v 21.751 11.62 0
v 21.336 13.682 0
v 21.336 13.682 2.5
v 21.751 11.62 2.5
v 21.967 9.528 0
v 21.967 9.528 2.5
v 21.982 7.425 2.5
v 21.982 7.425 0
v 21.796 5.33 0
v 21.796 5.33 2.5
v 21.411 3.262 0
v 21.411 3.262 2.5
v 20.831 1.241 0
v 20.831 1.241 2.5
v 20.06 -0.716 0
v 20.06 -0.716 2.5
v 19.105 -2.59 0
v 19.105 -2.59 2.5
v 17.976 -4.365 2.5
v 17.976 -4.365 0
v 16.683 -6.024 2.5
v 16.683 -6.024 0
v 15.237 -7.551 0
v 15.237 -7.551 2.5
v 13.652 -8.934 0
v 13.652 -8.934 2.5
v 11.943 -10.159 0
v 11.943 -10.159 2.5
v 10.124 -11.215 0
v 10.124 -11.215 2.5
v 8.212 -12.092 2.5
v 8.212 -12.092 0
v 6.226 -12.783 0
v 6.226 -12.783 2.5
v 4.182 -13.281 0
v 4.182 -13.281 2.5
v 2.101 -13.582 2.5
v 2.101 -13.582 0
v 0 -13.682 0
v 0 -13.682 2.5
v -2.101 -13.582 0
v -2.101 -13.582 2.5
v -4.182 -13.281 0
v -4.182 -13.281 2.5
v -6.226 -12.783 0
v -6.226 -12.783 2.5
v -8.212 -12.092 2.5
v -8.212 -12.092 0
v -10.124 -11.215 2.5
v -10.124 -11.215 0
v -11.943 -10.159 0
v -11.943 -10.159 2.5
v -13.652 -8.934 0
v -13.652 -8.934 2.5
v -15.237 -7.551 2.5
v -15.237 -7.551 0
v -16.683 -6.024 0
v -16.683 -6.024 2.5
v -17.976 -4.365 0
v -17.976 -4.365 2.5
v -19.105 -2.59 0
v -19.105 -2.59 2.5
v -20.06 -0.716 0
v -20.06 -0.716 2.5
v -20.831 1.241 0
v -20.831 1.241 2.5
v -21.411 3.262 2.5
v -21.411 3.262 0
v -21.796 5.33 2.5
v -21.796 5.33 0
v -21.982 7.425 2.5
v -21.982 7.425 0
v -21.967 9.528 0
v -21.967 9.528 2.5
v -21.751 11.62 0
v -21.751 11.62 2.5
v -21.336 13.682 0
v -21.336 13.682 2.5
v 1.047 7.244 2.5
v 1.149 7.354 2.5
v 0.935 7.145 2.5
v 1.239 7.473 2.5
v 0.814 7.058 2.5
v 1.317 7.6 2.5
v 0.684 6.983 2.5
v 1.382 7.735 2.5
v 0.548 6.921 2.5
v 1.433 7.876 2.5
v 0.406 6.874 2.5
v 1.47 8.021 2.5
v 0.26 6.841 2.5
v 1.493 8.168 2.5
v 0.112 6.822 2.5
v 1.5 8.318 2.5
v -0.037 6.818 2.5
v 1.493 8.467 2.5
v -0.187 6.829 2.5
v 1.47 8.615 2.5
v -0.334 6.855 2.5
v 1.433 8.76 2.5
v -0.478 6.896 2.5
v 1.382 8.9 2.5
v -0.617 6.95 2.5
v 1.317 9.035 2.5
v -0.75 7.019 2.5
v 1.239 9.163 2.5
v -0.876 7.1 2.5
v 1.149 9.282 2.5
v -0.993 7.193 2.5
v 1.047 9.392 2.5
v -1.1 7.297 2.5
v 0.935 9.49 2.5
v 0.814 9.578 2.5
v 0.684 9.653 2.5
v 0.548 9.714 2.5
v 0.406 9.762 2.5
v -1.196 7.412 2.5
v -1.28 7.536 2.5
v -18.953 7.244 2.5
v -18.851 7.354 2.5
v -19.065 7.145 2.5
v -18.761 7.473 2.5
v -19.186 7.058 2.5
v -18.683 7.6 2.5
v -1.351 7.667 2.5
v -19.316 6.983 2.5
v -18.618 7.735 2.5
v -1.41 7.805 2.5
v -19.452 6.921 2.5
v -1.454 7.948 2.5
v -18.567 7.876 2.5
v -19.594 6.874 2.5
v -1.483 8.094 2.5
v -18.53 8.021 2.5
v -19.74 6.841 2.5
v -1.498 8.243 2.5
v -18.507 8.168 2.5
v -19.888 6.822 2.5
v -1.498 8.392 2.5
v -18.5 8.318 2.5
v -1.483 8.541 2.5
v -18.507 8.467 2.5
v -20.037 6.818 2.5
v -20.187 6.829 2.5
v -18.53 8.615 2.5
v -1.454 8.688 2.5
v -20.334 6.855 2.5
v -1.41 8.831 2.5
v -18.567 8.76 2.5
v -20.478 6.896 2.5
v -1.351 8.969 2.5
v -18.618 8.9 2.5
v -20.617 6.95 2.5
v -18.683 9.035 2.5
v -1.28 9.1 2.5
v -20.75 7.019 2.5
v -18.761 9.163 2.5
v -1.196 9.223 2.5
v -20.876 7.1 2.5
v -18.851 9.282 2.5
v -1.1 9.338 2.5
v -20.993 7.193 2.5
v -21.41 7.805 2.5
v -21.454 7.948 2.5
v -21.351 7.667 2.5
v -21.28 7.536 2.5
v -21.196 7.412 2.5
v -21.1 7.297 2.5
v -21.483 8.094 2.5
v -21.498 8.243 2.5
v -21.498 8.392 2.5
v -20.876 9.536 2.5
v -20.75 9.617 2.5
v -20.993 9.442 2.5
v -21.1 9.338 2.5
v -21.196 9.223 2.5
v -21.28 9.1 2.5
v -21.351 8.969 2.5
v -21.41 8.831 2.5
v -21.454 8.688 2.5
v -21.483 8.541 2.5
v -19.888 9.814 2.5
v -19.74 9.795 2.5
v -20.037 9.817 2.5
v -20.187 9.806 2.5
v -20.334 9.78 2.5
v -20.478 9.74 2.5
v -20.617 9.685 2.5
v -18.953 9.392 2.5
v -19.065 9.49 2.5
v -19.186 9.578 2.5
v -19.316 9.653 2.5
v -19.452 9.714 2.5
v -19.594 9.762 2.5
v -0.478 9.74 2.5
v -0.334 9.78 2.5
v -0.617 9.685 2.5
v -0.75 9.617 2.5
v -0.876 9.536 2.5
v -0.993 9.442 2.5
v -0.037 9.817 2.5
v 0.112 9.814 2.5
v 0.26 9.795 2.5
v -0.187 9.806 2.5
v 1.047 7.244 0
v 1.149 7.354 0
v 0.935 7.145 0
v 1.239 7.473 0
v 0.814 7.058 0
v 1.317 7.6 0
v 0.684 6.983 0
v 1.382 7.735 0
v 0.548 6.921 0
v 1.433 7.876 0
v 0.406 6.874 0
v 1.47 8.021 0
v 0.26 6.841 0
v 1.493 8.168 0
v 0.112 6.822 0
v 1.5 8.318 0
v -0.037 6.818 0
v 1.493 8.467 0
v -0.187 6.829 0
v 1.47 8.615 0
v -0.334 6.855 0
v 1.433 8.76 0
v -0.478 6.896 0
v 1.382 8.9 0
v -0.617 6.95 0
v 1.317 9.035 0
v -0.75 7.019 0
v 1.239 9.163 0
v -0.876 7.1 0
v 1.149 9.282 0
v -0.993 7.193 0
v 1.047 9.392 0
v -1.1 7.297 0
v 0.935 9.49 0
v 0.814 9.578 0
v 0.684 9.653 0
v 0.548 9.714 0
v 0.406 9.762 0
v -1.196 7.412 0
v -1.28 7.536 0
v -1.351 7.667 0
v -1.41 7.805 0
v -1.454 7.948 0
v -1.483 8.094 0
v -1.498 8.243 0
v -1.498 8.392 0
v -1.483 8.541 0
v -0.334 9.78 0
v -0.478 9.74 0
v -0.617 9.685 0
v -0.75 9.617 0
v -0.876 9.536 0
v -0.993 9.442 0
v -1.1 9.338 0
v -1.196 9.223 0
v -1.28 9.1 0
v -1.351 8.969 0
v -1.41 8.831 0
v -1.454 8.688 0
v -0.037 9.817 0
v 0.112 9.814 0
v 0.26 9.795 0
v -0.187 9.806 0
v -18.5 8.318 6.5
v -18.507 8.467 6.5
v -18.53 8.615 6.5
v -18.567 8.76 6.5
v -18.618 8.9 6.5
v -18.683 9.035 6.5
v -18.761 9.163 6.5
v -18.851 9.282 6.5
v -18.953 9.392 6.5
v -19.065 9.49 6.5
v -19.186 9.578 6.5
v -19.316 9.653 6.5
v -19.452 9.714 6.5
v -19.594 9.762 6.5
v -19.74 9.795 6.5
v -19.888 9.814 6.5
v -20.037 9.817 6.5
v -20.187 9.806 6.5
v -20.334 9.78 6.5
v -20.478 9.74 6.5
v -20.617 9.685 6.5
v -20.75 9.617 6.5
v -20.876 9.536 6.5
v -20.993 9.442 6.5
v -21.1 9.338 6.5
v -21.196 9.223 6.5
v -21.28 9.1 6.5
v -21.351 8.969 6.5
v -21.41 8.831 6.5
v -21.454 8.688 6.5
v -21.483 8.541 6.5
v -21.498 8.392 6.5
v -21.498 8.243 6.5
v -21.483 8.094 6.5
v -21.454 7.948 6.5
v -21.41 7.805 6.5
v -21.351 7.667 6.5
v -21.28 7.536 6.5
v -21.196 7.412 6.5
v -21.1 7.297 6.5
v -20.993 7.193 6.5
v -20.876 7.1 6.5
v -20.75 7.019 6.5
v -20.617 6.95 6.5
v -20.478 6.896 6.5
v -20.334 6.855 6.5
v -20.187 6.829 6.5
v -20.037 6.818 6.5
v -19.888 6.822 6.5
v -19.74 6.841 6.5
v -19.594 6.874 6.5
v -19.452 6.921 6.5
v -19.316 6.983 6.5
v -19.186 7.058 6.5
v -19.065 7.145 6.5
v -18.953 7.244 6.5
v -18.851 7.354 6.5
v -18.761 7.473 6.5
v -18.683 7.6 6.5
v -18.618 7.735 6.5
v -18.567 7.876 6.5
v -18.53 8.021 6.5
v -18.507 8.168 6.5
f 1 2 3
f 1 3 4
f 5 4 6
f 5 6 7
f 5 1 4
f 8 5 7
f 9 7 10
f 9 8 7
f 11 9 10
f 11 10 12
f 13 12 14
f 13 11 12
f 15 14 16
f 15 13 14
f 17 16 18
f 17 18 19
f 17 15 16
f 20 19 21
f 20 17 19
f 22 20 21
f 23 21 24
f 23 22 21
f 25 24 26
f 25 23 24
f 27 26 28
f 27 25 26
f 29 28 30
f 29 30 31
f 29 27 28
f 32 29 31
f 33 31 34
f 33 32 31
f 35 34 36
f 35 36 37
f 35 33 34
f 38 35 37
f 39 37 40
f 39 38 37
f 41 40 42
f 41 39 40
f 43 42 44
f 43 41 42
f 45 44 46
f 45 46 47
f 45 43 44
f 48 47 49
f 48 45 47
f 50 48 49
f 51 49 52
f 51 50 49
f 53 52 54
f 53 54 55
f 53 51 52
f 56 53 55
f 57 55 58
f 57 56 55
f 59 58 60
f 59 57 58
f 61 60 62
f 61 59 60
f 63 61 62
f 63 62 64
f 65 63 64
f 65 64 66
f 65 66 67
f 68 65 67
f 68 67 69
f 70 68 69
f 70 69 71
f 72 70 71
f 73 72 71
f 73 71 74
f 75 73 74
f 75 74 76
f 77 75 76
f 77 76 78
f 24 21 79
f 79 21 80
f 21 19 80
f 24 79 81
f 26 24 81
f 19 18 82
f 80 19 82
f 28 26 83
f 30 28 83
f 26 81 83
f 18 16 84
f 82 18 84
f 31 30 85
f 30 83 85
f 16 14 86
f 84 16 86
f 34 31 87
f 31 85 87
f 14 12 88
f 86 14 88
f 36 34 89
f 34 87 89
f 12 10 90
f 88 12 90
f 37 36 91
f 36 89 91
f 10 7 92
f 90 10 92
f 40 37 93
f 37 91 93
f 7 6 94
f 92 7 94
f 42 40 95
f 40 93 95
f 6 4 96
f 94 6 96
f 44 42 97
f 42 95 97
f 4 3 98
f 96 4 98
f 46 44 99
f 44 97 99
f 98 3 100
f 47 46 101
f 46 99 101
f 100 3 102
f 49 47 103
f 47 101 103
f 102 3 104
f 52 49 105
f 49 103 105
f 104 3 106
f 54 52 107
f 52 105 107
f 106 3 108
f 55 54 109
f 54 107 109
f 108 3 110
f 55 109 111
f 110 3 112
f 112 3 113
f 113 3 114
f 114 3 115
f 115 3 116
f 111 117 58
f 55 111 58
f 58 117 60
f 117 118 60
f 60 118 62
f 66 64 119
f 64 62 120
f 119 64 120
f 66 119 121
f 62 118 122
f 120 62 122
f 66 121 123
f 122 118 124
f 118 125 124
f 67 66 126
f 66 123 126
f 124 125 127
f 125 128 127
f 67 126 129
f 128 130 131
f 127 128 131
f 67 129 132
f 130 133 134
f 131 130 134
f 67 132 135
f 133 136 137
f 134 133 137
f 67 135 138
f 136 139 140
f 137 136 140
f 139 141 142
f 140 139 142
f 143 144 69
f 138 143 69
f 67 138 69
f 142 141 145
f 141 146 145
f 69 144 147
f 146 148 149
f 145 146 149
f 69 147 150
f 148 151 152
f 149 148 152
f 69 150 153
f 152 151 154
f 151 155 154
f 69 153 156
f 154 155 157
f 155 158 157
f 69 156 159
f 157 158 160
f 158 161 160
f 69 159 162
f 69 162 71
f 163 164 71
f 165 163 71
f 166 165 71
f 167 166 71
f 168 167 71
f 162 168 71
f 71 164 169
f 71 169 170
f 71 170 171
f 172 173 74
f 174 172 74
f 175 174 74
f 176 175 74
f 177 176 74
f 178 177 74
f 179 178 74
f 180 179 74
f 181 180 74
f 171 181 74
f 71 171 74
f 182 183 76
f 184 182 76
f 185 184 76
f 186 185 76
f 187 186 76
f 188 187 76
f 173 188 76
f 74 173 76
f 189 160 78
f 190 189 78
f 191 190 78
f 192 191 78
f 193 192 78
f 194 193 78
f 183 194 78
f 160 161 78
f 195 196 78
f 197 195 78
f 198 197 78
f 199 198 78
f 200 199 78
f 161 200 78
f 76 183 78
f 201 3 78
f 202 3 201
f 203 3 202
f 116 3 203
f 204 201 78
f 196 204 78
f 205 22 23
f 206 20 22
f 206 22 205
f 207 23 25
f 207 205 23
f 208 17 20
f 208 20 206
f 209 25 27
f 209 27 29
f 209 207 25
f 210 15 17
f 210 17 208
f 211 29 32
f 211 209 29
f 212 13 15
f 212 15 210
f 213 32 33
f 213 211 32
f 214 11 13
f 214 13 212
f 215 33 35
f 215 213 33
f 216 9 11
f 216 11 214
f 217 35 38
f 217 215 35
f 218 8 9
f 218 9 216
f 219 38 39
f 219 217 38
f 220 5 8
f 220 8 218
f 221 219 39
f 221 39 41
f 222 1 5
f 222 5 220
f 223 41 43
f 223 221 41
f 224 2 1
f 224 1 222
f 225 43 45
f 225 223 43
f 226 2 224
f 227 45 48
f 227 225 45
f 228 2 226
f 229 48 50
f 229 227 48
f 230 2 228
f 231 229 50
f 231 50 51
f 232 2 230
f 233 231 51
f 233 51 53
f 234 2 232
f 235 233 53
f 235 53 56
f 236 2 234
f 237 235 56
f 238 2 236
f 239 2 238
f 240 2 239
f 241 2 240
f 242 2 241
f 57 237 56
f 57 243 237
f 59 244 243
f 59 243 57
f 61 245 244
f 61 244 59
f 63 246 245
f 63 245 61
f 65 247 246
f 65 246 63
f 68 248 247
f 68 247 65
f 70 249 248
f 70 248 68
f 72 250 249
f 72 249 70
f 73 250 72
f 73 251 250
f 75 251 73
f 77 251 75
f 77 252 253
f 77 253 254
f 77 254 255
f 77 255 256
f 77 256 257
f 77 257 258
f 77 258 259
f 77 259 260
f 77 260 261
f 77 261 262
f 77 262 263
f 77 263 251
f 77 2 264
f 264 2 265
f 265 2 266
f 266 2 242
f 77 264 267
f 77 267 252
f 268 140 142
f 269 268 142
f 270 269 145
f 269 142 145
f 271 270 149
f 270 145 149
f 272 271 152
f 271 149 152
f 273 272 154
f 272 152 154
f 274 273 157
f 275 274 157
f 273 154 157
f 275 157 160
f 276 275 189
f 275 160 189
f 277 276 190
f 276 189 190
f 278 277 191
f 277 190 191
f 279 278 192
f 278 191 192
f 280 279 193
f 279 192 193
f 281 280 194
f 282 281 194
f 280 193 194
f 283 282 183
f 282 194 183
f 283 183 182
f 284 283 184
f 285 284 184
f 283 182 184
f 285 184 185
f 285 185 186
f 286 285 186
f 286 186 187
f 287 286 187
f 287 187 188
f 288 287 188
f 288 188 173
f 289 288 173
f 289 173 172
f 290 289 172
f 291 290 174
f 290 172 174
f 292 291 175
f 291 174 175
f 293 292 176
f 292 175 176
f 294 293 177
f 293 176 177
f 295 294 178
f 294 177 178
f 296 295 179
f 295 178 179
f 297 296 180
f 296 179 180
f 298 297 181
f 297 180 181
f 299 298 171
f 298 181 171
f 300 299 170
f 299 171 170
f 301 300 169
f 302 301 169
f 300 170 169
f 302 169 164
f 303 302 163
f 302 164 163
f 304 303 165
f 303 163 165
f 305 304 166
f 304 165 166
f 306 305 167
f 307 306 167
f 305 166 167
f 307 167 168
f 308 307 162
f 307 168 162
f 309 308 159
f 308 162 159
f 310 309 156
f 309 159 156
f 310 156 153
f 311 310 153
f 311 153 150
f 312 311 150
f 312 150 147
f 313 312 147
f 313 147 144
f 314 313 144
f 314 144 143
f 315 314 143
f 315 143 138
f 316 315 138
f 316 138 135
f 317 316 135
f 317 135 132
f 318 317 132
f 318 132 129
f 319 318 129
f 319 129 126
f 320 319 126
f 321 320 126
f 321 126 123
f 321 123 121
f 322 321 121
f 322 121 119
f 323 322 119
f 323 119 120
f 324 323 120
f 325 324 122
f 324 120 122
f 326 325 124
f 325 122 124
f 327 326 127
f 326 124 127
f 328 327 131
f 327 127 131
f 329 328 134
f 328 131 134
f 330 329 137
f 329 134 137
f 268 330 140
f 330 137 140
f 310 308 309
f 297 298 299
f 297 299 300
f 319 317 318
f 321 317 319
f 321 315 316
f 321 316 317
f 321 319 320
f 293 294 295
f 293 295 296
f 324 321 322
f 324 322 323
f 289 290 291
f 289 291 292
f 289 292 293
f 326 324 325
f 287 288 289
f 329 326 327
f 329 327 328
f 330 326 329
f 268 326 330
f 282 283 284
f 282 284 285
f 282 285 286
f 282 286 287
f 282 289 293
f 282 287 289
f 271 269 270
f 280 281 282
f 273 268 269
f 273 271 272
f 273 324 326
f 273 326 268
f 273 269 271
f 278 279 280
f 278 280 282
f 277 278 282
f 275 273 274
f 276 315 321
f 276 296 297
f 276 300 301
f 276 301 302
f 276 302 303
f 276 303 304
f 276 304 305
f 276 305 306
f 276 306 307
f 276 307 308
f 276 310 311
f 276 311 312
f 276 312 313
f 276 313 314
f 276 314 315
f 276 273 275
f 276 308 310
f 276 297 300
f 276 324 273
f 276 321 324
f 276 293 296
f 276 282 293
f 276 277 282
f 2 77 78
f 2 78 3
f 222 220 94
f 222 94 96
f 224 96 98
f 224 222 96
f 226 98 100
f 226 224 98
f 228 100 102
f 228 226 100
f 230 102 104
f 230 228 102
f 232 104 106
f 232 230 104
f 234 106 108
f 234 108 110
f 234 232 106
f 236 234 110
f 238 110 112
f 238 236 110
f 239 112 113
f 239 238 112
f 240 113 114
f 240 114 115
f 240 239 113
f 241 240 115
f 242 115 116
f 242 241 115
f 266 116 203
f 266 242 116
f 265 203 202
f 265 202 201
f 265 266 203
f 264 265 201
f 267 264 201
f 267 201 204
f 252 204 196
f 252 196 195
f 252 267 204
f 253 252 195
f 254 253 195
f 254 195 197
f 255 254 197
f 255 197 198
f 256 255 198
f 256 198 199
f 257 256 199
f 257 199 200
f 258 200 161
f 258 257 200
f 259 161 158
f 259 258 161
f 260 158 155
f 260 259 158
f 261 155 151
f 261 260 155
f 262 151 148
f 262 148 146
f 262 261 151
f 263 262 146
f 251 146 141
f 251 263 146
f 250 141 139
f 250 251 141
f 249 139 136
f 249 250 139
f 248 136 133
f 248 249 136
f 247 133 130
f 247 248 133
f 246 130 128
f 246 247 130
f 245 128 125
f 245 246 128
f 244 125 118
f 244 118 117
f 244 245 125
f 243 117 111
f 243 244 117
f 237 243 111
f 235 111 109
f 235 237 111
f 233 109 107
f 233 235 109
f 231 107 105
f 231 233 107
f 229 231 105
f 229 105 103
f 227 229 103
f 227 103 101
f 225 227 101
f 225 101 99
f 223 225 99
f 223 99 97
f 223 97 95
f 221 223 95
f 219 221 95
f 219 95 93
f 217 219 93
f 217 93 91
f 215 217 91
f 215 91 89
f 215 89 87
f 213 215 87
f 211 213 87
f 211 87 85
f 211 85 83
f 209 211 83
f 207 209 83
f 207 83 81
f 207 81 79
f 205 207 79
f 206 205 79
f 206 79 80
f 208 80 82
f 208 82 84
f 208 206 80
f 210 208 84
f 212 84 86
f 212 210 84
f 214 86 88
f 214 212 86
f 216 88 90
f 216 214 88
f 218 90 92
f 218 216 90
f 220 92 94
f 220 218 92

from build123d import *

# Parameters (mm, degrees)
SKETCH1_R           = 1.5
BOSS_EXTRUDE1_DEPTH = 2.5
SKETCH2_R           = 1.5
BOSS_EXTRUDE2_DEPTH = 4


with BuildPart() as part:
    # Sketch1 → Boss-Extrude1 (new body)
    with BuildSketch(Plane.XY):
        with BuildLine():
            Line((-21.335922229, 13.682276209), (21.335922229, 13.682276209))
            ThreePointArc((21.335922229, 13.682276209), (0, -13.682276209), (-21.335922229, 13.682276209))
        make_face()
        with Locations((0, 8.317723791)):
            Circle(SKETCH1_R, mode=Mode.SUBTRACT)
    extrude(amount=BOSS_EXTRUDE1_DEPTH)

    # Sketch2 → Boss-Extrude2 (add)
    with BuildSketch(Plane.XY.offset(2.5)):
        with Locations((-20, 8.317723791)):
            Circle(SKETCH2_R)
    extrude(amount=BOSS_EXTRUDE2_DEPTH)


solid = part.part
